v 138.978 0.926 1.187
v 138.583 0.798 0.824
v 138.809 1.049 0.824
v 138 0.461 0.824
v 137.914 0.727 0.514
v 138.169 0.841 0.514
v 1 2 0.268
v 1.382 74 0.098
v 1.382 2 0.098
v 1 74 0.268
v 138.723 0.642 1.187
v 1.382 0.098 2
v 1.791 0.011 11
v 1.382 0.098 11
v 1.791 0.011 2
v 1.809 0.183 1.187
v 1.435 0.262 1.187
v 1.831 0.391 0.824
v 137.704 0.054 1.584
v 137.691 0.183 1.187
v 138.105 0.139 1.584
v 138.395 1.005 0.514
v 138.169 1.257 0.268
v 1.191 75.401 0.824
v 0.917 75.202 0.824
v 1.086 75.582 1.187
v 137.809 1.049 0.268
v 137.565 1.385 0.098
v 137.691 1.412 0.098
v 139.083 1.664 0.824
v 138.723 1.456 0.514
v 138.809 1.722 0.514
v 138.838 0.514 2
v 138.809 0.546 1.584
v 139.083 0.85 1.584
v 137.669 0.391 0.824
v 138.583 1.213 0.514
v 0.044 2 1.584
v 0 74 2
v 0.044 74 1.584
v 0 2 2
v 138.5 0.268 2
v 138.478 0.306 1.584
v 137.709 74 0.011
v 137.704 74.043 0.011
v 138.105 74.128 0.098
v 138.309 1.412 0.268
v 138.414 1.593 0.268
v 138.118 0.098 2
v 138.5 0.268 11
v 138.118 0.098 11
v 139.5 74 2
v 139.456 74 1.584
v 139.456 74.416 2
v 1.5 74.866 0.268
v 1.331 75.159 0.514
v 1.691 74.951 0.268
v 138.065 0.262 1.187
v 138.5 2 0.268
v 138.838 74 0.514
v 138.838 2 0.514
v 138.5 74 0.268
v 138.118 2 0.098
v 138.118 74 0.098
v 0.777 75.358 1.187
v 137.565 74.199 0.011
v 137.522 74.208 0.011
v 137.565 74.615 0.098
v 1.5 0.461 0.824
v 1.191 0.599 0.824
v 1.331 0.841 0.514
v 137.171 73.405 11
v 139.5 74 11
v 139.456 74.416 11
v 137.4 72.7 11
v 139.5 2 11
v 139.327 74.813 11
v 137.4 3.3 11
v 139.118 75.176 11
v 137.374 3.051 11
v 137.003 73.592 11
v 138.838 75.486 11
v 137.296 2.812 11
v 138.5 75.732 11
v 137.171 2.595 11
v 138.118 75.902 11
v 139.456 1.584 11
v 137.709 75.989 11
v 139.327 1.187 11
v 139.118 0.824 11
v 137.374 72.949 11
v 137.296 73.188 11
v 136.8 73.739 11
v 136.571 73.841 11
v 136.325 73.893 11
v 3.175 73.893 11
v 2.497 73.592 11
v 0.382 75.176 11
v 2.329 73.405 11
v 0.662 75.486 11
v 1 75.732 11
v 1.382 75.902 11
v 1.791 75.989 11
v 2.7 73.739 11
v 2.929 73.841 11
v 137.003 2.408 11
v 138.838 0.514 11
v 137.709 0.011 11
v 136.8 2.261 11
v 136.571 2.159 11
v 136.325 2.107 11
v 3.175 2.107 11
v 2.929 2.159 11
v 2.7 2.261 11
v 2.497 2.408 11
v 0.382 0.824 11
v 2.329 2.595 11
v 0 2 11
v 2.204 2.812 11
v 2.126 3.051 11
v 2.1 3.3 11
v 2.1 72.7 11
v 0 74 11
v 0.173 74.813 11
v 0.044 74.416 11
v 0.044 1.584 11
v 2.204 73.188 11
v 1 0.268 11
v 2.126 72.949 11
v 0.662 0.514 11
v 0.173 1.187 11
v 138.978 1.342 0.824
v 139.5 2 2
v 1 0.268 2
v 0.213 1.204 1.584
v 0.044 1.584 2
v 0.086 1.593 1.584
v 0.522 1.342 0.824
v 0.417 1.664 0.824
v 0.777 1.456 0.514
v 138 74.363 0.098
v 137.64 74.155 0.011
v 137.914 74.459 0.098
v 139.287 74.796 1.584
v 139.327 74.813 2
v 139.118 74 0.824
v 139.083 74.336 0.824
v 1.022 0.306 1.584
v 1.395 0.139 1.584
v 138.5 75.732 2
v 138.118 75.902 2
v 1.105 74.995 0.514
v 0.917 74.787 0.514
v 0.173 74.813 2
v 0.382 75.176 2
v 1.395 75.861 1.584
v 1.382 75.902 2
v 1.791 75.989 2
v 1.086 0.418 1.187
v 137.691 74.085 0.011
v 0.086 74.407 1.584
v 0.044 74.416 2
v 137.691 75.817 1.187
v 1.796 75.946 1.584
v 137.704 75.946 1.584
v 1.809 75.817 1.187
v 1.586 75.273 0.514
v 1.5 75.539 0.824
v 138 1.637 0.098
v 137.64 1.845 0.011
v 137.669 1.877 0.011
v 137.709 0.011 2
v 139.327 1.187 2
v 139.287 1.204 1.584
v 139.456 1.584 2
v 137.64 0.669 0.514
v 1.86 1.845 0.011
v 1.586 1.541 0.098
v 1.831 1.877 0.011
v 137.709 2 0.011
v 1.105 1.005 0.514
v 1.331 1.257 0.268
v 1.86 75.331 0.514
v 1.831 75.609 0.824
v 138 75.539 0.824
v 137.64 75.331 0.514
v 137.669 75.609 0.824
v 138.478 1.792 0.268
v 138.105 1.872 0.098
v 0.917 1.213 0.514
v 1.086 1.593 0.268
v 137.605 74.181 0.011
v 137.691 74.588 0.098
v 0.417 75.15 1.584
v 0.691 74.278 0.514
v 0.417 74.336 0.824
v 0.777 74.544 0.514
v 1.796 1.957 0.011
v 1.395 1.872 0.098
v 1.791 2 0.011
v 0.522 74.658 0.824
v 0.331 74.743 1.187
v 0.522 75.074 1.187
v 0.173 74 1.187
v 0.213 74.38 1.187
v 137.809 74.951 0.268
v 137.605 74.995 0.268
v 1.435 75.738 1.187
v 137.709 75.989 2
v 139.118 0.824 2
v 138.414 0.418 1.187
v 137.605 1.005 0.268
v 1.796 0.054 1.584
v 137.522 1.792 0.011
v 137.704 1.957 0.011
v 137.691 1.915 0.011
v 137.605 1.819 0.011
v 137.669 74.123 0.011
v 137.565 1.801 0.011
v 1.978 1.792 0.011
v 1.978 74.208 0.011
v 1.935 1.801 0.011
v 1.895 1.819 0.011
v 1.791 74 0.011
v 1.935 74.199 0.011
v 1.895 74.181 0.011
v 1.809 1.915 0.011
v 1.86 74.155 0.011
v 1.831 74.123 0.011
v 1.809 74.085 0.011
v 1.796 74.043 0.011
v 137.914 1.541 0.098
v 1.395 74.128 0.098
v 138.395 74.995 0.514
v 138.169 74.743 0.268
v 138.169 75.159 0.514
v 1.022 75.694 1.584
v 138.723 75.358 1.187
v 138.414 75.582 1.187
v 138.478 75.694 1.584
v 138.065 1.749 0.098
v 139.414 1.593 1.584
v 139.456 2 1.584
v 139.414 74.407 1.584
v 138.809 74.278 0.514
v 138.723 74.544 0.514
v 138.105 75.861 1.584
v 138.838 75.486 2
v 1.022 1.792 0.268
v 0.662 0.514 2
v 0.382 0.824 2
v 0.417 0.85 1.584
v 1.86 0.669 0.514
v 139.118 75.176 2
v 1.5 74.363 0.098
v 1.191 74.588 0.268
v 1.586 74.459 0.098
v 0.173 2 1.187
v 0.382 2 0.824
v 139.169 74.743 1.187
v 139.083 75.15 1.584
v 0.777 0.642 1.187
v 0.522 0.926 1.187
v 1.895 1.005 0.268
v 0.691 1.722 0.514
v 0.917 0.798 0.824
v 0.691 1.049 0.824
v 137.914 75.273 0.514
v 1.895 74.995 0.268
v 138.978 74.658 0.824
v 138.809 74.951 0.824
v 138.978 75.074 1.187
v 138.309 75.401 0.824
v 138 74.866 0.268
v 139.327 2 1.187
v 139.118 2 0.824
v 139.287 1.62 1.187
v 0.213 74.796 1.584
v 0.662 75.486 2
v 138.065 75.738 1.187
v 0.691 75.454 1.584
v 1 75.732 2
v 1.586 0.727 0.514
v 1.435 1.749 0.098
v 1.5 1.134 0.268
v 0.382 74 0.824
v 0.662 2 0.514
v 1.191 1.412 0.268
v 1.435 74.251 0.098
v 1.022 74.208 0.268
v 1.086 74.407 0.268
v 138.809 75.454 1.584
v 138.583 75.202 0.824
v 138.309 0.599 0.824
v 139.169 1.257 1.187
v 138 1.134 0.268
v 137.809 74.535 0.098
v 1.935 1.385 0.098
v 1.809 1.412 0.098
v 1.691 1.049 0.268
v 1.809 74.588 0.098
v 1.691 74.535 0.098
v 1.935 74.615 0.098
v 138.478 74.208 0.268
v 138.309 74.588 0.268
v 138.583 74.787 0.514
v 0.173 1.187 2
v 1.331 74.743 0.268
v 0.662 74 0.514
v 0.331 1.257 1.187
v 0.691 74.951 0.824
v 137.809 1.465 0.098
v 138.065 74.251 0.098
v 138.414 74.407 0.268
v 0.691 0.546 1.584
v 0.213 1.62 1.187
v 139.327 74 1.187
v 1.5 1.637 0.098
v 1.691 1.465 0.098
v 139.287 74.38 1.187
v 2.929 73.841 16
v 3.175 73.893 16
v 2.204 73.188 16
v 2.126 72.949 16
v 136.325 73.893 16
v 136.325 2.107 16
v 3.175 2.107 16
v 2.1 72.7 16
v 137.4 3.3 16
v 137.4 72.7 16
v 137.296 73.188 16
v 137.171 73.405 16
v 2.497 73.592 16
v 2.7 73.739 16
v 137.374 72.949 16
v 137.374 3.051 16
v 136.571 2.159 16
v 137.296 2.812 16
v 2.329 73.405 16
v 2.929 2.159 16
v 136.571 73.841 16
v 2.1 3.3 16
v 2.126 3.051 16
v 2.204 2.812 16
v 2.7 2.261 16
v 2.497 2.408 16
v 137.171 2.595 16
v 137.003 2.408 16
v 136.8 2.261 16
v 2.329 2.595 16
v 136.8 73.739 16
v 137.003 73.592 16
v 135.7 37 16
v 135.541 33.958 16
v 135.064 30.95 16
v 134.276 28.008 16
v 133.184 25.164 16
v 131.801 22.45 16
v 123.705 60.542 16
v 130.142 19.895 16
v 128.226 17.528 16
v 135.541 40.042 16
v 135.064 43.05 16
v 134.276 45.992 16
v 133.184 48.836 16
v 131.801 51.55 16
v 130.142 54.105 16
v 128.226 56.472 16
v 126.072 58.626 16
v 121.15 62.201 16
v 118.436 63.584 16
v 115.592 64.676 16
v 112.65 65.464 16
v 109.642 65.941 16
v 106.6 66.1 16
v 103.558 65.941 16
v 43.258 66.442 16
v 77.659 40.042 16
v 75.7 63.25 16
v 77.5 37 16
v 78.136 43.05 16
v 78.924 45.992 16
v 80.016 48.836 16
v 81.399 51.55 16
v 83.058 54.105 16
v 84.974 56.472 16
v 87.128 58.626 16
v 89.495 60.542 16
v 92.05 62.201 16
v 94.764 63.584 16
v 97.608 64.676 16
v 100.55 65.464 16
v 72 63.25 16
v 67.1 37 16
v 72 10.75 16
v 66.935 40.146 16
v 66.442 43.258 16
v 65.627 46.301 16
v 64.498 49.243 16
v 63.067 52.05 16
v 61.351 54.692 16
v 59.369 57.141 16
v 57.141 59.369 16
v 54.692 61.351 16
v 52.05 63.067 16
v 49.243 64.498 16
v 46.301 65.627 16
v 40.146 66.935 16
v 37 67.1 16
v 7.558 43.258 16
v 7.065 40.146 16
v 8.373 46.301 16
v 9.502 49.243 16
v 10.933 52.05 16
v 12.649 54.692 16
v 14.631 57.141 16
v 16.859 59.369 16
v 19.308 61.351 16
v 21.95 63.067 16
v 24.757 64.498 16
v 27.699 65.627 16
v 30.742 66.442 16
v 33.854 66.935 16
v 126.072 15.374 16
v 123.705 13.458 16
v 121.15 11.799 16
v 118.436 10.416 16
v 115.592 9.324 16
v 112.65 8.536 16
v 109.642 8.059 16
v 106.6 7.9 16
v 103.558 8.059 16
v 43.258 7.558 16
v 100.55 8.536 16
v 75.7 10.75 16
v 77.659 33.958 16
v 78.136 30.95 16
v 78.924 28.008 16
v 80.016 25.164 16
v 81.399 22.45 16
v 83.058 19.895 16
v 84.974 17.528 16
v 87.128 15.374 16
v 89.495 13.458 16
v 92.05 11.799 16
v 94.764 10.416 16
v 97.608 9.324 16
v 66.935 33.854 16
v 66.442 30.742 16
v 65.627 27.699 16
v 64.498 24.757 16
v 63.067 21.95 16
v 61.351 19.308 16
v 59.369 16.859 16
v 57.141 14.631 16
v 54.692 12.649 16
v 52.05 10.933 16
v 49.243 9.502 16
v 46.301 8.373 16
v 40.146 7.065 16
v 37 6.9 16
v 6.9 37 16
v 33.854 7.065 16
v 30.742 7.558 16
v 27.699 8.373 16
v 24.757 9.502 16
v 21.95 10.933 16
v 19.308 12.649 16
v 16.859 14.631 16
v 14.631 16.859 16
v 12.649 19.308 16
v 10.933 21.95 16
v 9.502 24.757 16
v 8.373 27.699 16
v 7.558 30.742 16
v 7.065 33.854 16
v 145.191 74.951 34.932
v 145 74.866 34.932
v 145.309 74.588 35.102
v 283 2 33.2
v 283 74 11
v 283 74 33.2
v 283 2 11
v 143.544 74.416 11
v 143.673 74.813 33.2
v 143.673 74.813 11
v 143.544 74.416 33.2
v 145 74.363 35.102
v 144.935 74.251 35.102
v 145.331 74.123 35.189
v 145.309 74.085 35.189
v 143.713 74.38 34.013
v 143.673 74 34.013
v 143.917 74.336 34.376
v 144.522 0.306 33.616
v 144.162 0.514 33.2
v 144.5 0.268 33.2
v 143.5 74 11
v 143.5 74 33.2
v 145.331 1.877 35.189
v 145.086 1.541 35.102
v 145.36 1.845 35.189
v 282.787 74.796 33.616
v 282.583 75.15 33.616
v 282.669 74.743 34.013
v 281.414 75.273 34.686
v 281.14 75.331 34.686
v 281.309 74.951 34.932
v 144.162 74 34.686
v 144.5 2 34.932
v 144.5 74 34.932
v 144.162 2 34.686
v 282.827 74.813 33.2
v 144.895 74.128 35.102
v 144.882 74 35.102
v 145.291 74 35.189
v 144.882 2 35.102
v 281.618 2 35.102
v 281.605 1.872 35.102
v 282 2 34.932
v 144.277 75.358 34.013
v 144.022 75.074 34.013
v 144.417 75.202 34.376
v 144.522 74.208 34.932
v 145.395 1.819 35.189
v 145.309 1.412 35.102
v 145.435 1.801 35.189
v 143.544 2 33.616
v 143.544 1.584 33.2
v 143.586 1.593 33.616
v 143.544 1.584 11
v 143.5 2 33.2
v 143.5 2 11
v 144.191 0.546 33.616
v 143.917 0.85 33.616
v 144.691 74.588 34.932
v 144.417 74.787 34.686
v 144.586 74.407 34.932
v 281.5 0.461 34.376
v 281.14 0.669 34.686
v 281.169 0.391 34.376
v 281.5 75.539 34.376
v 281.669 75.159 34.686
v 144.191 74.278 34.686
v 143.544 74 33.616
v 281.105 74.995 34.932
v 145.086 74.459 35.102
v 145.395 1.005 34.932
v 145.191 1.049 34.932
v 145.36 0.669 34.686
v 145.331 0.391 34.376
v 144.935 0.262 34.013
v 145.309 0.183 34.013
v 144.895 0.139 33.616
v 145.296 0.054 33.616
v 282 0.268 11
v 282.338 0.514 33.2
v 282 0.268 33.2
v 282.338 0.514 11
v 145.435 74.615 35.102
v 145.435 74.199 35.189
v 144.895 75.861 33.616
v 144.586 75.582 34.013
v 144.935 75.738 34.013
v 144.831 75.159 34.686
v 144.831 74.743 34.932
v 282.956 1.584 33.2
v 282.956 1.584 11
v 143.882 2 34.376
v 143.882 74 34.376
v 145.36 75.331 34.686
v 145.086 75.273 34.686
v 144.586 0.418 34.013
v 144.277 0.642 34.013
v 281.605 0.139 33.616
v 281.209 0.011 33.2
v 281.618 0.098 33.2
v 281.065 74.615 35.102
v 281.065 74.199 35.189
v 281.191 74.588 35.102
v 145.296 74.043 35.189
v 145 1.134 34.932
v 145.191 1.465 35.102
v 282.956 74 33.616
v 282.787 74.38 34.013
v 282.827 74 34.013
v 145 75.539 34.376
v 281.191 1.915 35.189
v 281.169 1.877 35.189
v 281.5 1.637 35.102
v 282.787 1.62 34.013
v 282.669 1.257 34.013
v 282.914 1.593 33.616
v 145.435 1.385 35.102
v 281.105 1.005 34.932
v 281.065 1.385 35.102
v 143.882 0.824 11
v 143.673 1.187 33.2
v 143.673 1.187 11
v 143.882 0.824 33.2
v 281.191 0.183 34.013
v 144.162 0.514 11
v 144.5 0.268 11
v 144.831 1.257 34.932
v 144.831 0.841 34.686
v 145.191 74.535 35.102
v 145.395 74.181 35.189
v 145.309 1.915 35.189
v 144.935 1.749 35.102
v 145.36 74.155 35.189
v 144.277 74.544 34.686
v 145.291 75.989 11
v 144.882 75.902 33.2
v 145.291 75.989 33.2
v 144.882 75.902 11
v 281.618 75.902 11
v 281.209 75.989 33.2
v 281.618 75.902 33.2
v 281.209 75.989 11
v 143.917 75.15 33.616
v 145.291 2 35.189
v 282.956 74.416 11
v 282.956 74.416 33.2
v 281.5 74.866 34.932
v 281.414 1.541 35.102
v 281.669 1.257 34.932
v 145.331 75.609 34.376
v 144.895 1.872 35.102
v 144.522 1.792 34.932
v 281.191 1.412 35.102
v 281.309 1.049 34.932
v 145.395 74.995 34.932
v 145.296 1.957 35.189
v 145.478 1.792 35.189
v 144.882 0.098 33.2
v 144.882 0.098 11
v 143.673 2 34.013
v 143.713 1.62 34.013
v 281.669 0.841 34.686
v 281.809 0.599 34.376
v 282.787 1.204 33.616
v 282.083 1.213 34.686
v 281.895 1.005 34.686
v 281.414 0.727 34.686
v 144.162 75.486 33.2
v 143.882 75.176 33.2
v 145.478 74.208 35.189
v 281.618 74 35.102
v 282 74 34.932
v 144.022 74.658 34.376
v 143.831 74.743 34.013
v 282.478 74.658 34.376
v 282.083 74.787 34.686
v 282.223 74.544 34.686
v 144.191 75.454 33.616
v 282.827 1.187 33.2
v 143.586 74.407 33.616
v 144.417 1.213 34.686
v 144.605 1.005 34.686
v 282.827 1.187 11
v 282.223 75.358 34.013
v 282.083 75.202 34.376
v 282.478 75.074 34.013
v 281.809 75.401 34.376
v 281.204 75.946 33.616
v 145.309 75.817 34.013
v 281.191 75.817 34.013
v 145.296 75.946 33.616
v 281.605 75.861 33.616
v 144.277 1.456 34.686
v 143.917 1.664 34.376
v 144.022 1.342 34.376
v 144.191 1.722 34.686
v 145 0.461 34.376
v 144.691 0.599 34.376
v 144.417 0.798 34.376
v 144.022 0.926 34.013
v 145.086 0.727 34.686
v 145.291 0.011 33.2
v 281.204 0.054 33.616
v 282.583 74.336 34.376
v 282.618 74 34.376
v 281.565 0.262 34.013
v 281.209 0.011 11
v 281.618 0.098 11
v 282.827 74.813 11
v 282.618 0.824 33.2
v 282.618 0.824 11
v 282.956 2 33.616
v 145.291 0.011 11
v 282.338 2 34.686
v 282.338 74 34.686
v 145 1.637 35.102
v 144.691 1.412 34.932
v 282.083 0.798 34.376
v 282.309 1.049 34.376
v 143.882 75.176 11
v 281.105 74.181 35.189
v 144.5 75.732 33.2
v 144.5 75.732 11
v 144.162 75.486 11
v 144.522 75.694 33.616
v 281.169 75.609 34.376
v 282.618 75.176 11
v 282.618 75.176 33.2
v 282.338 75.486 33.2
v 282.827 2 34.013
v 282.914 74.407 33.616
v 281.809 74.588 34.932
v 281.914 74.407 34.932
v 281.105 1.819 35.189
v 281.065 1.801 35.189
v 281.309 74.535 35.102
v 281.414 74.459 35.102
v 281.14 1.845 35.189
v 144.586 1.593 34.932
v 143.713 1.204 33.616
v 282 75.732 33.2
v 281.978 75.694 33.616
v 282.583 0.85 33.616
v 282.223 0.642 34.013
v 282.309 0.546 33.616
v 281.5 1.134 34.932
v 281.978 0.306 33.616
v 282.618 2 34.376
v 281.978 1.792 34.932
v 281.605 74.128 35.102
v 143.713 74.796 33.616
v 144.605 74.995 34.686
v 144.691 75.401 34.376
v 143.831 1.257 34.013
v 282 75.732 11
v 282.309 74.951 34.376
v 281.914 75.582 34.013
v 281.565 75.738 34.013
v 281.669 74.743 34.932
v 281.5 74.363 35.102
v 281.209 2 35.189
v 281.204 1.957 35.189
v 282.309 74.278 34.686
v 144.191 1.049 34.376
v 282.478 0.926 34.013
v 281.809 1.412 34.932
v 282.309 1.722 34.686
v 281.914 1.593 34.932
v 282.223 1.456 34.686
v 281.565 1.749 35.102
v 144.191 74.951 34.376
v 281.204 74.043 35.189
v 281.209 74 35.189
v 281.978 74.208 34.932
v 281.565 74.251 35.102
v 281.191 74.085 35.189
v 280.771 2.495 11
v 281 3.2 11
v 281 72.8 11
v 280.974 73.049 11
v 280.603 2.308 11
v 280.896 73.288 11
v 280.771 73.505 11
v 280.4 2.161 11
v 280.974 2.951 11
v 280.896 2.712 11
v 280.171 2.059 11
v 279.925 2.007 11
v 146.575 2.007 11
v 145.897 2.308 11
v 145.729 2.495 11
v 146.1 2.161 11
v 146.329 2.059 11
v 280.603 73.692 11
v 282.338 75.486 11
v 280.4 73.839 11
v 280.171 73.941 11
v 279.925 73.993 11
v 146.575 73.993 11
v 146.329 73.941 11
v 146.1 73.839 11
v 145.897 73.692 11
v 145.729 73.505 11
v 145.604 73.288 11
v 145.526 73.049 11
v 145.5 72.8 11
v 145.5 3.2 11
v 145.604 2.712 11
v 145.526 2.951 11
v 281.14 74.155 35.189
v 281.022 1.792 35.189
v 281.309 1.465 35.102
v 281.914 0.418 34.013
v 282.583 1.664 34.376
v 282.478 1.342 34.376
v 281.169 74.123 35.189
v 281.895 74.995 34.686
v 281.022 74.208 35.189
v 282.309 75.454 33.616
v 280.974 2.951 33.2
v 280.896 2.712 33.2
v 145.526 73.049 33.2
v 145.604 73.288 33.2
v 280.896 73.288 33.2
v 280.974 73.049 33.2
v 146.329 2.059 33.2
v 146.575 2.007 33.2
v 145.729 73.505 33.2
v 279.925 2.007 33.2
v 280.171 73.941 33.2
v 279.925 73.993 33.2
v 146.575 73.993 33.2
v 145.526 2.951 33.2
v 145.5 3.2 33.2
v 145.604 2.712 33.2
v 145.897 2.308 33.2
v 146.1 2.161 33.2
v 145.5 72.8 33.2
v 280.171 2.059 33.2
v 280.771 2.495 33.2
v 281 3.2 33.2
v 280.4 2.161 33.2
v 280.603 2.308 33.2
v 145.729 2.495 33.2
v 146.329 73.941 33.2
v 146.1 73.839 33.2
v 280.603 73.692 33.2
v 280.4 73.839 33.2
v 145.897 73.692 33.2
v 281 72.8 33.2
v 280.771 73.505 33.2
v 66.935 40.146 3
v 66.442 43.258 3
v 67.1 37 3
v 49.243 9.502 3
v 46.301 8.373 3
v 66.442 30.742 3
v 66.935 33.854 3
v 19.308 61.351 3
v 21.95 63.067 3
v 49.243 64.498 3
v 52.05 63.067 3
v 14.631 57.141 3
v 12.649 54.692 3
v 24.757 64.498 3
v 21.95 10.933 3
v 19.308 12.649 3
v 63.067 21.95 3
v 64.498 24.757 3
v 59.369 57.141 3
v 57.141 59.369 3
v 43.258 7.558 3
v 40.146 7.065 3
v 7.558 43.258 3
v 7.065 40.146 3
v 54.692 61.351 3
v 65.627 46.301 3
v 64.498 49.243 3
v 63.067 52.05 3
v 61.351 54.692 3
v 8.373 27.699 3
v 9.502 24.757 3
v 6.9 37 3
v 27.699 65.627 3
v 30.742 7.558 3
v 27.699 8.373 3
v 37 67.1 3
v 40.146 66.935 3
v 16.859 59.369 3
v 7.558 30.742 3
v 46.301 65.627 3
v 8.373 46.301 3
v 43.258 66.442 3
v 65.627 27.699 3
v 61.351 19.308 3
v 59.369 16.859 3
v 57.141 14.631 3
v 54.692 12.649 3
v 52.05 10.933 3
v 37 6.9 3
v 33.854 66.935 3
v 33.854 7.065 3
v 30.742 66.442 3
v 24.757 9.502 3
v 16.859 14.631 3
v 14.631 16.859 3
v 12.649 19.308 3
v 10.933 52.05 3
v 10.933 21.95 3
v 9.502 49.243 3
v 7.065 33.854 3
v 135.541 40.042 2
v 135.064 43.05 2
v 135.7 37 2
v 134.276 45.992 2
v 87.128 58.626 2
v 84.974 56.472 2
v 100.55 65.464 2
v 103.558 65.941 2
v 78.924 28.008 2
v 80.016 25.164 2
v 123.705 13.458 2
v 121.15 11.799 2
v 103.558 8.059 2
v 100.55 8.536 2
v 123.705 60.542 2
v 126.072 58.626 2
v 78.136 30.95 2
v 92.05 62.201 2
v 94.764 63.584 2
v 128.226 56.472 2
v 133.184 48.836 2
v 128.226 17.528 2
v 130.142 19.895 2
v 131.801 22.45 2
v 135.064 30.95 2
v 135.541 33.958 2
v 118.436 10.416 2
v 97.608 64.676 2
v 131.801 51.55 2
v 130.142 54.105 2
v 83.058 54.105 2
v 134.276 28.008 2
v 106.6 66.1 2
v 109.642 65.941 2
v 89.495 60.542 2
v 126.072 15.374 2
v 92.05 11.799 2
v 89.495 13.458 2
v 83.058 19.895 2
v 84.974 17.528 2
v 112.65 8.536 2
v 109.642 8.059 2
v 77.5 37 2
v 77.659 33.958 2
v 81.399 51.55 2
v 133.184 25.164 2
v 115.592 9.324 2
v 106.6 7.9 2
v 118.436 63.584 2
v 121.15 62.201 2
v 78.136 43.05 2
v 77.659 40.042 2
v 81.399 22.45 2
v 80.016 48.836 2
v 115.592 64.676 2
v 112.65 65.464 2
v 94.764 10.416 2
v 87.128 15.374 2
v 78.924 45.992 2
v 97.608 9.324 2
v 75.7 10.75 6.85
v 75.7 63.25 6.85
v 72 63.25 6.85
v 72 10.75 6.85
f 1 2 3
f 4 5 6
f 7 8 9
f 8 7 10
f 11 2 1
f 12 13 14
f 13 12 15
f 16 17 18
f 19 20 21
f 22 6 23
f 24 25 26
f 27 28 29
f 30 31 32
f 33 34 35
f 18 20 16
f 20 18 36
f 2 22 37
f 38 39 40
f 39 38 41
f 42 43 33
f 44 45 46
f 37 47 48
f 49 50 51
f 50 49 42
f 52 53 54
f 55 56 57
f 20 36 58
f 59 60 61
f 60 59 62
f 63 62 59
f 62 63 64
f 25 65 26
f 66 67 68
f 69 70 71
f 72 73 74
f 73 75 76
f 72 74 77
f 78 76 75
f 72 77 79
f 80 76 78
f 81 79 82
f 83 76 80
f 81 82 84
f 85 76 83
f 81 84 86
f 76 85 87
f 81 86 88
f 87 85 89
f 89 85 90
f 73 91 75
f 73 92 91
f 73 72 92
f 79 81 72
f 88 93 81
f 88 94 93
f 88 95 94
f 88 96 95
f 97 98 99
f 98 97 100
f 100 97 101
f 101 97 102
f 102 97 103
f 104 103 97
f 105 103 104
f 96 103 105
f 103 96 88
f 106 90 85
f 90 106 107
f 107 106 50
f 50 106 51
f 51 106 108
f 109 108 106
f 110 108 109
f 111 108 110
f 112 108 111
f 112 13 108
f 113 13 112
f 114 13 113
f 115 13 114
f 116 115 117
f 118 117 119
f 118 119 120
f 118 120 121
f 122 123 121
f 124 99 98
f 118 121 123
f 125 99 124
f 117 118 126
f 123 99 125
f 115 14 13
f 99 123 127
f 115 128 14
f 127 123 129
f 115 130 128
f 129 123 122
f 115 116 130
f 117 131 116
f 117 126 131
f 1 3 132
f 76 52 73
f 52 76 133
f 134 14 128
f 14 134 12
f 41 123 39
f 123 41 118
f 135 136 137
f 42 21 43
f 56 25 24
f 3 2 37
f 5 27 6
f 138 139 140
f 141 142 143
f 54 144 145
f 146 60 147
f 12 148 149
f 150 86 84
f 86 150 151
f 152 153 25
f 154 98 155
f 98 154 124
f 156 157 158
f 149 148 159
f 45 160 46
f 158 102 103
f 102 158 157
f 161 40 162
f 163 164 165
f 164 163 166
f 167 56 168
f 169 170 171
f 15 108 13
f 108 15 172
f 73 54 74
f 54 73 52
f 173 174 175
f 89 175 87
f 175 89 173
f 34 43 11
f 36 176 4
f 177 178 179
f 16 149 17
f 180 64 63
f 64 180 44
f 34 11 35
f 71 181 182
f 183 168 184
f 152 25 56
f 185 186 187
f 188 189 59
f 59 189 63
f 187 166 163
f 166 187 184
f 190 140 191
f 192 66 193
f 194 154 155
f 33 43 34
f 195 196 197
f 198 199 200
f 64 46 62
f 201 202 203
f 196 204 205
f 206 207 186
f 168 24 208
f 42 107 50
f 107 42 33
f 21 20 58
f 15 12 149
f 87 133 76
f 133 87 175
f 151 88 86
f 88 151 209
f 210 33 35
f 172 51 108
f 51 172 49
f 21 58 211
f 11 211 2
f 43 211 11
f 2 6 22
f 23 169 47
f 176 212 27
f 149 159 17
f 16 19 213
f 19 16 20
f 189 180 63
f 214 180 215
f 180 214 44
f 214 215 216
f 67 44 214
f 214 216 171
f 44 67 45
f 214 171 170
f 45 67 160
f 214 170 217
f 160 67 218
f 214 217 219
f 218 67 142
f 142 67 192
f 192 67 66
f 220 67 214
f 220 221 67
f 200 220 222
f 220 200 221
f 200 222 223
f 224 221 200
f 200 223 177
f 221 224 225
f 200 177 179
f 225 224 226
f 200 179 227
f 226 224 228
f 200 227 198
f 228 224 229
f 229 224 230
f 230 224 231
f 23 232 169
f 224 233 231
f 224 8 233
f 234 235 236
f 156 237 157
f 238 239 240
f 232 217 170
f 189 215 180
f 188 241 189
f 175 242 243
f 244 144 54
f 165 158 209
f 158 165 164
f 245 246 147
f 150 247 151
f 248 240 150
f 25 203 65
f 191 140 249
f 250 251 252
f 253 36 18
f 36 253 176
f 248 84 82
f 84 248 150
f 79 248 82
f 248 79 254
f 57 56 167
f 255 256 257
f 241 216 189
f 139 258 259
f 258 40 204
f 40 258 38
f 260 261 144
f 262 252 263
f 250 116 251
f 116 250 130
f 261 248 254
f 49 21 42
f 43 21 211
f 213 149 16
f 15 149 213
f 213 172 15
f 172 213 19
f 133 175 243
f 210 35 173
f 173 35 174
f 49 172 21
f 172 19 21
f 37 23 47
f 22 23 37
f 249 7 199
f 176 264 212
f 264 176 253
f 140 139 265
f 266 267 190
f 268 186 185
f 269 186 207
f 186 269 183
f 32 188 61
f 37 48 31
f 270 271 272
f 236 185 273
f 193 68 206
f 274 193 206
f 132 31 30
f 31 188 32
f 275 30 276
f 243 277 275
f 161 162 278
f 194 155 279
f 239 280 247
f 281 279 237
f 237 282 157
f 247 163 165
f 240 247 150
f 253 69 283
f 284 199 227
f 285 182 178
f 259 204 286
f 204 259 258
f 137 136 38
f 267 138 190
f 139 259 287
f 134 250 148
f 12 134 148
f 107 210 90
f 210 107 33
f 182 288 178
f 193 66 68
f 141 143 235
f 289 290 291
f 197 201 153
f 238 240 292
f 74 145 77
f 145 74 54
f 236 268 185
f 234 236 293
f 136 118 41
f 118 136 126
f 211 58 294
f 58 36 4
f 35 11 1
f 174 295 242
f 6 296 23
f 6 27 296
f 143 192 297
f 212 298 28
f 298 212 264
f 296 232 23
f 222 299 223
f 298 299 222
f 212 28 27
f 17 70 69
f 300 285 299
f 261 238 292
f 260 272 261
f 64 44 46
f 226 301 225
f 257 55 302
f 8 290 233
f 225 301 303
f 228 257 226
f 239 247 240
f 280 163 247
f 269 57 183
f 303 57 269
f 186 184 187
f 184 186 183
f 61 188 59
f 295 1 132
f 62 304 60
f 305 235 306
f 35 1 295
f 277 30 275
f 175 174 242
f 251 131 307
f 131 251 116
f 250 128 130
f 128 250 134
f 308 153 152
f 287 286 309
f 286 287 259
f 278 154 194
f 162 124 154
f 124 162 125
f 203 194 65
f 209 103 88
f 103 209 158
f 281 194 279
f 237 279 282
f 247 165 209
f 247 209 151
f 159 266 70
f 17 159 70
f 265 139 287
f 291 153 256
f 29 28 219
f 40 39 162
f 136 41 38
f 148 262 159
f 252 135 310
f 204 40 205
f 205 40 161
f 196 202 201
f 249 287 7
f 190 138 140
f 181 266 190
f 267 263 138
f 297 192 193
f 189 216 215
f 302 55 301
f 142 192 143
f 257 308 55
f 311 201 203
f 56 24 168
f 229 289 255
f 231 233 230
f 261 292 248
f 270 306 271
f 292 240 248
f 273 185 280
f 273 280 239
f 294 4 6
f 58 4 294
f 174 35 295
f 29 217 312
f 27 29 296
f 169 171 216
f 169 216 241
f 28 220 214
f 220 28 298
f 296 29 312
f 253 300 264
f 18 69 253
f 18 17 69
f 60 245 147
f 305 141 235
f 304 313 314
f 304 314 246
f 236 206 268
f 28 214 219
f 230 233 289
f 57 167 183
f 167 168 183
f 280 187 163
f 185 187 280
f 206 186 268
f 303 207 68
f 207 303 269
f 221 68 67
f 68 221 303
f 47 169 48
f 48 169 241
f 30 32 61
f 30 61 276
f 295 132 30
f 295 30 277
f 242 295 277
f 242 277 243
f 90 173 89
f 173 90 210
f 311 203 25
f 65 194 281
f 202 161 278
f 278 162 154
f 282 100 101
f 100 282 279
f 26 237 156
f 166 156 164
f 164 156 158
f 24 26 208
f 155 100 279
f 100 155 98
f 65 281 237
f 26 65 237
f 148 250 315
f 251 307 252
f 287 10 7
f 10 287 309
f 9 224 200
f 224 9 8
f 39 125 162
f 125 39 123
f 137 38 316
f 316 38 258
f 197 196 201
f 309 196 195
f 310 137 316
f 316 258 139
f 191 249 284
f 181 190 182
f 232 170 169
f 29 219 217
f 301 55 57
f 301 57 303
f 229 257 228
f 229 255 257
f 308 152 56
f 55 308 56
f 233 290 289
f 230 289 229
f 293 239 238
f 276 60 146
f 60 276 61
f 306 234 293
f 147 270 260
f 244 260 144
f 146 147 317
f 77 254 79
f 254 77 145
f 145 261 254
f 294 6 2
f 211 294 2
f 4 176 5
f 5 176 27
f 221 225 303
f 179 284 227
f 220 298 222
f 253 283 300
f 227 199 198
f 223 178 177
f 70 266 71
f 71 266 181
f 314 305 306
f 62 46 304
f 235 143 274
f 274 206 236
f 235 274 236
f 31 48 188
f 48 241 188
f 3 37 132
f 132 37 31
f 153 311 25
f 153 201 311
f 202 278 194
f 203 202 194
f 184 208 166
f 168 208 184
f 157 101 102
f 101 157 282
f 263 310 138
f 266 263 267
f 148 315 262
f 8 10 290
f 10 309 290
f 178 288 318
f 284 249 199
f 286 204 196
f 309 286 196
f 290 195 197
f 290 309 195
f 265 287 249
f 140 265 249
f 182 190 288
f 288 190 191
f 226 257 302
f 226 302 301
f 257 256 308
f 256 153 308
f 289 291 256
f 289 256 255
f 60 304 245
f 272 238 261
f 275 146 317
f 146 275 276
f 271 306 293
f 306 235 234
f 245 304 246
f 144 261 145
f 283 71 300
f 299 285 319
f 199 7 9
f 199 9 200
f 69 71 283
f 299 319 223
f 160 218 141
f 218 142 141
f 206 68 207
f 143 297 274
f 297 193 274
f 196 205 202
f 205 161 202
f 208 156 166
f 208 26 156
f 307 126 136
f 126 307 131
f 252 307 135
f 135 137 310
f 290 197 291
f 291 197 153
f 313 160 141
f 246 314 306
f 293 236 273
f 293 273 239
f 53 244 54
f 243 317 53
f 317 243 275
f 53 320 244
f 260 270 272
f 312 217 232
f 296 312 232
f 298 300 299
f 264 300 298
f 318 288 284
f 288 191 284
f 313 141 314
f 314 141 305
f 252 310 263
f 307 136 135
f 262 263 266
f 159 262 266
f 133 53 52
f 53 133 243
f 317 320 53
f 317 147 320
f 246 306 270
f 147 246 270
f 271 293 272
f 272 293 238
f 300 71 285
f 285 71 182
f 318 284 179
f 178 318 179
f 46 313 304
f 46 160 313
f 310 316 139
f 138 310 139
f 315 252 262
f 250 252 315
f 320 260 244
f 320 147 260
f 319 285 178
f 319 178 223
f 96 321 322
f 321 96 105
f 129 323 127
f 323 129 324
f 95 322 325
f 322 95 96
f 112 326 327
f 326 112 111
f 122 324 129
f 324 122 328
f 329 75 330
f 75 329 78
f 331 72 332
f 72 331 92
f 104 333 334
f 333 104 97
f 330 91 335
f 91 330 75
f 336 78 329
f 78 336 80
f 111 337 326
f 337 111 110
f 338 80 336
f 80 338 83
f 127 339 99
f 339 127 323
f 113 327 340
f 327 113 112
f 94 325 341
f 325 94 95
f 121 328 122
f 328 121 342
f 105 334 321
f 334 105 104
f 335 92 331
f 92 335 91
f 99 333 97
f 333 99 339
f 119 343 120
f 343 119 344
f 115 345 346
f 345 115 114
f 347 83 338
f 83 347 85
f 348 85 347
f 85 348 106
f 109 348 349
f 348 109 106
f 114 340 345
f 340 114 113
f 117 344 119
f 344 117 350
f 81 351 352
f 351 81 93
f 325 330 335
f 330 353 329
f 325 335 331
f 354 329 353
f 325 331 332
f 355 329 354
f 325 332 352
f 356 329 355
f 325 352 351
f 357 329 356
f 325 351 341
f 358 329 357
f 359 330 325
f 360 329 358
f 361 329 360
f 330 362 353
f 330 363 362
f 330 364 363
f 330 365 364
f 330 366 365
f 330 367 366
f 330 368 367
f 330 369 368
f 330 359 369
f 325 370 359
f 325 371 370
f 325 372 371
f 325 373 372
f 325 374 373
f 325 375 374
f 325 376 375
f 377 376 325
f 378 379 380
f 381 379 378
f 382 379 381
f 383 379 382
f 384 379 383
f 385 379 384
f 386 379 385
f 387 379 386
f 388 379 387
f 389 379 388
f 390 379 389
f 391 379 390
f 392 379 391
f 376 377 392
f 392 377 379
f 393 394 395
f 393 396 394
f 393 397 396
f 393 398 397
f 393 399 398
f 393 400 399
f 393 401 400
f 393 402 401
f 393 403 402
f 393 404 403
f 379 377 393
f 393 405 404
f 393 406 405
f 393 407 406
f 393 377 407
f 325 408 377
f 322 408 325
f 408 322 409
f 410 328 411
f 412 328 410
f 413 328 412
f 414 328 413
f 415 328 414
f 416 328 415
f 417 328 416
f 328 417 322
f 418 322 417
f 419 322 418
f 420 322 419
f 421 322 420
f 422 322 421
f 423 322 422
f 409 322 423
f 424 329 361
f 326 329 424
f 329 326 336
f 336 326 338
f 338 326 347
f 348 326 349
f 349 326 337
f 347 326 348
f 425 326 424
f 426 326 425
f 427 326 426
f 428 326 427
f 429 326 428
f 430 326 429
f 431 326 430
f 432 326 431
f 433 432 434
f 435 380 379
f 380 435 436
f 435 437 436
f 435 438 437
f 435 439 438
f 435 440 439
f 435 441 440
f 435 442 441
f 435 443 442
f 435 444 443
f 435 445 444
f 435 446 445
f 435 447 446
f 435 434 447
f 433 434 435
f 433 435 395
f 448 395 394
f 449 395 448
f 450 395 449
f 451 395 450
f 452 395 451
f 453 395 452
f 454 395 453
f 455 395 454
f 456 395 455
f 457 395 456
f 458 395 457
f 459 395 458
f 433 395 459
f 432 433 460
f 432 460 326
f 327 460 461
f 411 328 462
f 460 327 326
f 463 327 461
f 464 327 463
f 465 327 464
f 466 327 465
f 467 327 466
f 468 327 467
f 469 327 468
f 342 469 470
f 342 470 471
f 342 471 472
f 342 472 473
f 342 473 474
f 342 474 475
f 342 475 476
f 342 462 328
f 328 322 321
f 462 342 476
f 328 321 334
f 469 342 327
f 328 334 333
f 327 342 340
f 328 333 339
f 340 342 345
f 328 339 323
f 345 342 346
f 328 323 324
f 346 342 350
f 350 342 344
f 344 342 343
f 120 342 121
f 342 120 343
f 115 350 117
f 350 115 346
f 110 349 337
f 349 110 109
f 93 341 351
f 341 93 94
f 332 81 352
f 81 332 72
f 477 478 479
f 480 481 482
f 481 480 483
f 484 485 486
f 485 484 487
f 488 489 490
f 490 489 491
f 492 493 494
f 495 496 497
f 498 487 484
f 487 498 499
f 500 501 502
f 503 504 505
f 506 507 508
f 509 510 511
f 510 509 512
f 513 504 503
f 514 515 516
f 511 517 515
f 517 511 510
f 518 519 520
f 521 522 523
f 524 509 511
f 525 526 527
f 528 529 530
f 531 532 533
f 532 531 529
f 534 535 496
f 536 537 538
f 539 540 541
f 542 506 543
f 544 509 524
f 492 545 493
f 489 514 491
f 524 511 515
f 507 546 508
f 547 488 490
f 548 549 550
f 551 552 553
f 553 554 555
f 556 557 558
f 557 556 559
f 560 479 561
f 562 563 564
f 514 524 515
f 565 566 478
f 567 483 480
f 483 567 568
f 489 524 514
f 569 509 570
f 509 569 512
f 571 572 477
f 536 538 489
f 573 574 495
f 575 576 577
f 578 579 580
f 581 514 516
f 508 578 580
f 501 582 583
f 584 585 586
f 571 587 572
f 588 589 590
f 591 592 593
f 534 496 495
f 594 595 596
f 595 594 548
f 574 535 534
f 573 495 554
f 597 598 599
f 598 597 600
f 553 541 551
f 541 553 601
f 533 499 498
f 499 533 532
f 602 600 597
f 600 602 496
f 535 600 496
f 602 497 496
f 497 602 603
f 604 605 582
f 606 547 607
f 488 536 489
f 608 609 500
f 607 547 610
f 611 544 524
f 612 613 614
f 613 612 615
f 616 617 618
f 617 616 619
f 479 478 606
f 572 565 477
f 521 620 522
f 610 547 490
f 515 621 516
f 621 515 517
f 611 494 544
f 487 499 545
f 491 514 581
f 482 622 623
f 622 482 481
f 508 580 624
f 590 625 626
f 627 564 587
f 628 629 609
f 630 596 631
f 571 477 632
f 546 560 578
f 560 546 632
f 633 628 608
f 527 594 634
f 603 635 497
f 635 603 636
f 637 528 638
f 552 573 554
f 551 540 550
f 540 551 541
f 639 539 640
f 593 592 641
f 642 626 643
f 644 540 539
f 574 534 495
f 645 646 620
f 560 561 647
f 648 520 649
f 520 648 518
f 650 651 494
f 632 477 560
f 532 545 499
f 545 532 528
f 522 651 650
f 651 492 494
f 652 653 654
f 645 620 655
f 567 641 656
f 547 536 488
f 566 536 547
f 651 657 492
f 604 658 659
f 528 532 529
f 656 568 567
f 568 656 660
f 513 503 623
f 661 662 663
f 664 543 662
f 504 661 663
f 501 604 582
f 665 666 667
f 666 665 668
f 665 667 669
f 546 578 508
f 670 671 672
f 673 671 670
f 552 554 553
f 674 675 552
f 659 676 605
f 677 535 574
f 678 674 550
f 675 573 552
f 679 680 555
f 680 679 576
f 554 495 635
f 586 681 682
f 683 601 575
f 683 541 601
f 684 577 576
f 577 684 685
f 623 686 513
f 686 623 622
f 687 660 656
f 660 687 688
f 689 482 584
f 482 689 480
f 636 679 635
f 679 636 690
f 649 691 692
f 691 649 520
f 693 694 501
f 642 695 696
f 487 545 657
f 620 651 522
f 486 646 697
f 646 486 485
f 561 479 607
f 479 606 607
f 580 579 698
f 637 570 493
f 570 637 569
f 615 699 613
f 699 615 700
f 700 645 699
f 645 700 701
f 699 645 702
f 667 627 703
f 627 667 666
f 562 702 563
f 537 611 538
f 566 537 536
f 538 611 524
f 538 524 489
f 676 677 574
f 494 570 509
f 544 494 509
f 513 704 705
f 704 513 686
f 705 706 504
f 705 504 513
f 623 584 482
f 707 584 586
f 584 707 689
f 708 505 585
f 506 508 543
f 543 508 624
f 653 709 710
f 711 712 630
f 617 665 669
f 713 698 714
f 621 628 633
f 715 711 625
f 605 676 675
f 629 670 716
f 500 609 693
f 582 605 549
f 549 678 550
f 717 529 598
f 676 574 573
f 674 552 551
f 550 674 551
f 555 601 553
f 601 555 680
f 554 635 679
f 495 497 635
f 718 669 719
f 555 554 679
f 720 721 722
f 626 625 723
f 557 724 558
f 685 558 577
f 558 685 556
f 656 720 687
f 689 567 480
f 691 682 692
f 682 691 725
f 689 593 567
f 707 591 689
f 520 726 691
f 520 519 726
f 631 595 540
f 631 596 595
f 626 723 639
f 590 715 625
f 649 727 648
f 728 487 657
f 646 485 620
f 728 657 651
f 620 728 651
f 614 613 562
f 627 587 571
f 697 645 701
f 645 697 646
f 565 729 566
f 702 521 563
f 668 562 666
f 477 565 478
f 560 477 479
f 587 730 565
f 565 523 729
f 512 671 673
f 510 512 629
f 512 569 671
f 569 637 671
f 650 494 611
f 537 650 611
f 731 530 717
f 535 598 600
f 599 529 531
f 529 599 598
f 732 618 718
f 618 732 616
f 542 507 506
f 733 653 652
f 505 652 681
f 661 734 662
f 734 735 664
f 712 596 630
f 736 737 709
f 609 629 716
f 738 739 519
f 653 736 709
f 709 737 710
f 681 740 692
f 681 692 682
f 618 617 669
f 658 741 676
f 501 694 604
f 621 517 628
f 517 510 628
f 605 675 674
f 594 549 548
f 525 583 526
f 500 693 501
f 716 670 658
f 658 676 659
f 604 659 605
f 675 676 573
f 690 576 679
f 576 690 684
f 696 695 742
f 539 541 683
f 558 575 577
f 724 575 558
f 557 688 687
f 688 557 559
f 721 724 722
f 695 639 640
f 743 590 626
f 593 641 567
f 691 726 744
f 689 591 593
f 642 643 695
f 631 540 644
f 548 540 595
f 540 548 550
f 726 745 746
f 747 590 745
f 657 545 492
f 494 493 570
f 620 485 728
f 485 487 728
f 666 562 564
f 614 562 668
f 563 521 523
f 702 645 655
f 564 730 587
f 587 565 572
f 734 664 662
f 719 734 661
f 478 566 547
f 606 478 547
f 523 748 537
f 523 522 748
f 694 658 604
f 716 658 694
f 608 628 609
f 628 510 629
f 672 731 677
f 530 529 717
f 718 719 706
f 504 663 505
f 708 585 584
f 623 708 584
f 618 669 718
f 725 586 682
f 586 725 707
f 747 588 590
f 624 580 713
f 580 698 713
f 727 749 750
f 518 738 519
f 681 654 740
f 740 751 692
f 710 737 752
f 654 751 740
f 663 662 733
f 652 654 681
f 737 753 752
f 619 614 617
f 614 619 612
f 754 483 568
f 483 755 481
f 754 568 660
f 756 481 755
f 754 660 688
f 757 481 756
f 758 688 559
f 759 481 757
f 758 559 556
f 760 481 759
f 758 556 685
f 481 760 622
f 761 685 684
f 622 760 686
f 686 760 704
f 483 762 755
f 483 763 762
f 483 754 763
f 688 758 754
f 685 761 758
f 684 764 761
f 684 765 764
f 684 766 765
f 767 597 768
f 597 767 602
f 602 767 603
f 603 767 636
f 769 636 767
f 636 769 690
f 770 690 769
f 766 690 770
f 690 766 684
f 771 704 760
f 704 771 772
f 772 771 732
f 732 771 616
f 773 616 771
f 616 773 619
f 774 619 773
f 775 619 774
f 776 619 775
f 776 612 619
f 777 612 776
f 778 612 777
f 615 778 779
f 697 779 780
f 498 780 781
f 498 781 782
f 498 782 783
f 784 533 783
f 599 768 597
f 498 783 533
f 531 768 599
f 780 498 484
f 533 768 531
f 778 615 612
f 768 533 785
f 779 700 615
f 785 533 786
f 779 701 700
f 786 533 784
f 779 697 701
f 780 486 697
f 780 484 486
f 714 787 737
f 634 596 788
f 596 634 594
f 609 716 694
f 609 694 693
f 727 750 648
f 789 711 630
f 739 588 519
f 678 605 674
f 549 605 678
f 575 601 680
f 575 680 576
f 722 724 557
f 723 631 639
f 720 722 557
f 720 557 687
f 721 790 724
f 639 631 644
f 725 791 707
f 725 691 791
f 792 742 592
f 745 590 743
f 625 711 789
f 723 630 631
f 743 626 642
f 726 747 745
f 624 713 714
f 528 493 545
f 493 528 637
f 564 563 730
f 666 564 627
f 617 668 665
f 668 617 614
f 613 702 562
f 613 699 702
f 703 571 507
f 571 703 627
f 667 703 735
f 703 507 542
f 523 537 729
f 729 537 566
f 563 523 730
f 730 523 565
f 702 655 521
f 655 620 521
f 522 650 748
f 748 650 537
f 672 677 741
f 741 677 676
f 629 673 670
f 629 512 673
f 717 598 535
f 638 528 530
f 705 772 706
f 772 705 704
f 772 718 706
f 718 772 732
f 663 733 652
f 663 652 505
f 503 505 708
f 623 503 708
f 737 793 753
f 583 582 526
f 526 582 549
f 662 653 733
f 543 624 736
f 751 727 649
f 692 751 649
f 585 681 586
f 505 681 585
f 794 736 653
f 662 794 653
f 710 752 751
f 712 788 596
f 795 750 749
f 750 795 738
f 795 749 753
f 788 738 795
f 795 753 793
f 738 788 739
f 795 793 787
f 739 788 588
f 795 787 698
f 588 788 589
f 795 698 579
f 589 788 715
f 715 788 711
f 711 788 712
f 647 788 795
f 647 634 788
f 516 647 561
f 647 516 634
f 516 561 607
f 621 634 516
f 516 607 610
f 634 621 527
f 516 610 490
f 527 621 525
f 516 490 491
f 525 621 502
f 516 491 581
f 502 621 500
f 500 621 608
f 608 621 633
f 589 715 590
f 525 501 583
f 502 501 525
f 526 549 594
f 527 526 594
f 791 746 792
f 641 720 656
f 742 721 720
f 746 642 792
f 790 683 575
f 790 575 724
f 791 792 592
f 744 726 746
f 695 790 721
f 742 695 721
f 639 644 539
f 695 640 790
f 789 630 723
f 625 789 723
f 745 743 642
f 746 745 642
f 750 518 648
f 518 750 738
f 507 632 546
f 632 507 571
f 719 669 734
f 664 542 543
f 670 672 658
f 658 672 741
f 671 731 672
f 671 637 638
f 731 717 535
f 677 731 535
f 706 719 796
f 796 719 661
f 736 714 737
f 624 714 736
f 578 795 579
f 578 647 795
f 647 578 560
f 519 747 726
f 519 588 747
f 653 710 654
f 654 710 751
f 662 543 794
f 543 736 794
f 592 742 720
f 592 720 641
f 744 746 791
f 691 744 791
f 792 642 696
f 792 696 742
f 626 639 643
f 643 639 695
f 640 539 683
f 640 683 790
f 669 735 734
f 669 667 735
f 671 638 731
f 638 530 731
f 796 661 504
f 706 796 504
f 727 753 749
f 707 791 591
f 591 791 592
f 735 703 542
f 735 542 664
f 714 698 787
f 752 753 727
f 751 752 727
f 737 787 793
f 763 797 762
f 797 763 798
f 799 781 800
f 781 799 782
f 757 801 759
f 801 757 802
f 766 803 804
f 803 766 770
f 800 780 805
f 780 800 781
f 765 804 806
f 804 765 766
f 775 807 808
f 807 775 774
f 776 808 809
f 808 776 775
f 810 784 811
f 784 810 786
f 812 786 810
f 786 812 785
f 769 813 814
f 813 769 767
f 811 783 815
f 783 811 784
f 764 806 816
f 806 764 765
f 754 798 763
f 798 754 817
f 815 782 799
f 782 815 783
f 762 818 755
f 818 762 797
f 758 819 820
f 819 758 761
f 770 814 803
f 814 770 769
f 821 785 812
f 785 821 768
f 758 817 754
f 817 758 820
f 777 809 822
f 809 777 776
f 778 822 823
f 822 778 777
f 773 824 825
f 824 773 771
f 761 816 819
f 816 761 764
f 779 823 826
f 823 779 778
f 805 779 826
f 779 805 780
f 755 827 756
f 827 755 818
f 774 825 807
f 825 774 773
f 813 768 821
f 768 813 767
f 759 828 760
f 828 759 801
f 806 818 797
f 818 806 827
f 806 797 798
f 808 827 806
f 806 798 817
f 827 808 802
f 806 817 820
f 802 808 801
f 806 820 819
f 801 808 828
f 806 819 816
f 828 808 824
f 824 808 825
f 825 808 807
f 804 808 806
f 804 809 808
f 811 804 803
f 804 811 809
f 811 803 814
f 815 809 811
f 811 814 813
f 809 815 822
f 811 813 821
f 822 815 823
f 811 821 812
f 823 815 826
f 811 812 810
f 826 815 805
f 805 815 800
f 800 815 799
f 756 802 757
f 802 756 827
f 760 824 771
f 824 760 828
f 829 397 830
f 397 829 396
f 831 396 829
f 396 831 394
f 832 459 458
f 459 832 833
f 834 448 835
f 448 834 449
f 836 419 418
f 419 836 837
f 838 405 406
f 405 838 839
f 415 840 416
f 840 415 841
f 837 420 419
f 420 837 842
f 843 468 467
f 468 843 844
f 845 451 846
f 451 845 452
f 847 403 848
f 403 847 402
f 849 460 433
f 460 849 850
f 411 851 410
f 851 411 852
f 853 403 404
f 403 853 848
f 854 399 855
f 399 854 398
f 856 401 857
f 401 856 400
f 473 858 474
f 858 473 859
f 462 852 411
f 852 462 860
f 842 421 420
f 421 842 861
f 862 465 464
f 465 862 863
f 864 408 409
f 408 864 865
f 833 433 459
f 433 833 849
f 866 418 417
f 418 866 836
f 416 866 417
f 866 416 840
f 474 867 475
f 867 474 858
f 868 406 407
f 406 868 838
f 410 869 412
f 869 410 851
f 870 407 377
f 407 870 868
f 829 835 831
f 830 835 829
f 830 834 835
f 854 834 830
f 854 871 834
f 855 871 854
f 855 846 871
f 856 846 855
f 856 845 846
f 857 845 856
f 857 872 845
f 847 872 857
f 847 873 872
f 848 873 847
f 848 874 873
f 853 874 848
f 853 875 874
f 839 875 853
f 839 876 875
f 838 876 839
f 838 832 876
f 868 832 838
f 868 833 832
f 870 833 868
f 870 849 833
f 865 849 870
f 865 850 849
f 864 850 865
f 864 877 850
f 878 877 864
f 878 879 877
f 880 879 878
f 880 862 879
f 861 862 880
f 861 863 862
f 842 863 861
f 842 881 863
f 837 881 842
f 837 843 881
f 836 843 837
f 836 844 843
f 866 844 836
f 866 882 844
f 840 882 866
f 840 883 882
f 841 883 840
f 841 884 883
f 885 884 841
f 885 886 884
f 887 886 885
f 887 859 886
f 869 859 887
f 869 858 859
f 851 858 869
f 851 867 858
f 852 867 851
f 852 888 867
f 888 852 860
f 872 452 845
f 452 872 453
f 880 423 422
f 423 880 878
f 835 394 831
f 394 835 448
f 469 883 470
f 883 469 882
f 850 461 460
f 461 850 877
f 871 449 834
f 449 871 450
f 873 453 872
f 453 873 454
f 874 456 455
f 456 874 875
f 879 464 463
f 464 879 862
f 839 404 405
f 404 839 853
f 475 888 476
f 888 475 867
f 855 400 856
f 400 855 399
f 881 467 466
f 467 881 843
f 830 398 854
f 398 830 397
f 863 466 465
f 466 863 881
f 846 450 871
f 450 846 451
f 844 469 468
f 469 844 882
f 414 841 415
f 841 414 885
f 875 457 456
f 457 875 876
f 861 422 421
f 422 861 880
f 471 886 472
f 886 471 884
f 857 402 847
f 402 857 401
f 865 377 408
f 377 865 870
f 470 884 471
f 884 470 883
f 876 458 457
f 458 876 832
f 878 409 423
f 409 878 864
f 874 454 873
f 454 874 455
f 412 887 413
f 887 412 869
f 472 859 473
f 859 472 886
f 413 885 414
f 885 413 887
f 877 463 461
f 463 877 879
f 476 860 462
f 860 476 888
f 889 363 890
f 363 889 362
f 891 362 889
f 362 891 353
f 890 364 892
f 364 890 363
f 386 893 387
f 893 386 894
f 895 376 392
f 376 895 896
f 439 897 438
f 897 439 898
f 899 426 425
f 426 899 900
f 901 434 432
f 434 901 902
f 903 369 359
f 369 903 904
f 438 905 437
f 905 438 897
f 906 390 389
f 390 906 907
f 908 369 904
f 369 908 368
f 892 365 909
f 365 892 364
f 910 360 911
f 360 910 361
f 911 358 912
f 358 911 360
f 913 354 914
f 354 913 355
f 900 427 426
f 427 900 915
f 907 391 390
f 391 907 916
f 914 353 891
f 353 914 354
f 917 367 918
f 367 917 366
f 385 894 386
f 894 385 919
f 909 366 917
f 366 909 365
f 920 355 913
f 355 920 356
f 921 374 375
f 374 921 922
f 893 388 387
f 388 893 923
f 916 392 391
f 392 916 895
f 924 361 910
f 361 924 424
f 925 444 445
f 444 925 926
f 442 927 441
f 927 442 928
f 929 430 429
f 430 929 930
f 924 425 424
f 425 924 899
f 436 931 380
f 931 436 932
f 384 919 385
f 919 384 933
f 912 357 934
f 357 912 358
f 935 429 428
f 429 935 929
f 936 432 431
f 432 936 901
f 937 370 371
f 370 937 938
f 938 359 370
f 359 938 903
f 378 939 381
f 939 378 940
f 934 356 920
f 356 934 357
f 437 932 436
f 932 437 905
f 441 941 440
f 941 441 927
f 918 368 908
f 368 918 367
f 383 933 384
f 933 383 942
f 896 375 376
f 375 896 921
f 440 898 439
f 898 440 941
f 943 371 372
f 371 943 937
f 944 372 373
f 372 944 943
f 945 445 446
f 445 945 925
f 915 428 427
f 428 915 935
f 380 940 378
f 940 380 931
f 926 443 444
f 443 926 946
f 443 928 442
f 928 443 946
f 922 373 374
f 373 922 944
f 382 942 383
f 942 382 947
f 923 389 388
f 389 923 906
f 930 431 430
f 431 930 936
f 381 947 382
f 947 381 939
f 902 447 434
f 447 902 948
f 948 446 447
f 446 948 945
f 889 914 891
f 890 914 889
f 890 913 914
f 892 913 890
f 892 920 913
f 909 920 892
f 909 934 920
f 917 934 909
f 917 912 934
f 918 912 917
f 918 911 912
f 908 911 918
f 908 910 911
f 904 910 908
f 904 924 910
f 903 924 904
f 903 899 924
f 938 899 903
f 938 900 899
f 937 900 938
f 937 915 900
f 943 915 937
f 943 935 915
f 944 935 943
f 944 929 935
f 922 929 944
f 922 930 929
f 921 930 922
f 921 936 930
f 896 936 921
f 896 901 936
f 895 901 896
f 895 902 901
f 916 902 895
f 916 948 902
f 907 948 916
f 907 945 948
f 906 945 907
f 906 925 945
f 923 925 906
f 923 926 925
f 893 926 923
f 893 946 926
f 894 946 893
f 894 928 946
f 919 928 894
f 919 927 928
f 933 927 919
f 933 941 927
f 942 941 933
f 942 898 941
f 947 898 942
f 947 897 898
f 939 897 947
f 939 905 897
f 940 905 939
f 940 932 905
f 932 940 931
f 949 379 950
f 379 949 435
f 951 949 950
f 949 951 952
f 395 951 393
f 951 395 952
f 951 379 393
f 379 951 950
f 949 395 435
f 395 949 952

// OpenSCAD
// file: ../../lib/logo45.scad
module logo45() translate([-100,-130,0]) import(file = "../res/45.svg");

logo45();
// file: ../../lib/box-with-lid.scad
// A rounded box with a lid
use <./logo45.scad>

$fn = 30;
// Parameters
// - dimension: [x, y, z] - x is front, y is depth, z is height (total)
//   Dimension is treated as INNER dimension, meaning walls will be added on all sides.
// - wall: number - default 2 - thickness of lid, lid edge (and hollow box of selected.
// - use_logo: boolean - default true
// - solid: boolean - default true - whether box is a solid block inside. Used for hollowing the box to create inserts.
// If false, the box will have wall*2 thickness (lid has wall*1)
// - inner_tolerance: number - default 2 - distance between lid and top of box on the inside.
module box_with_lid(dimensions = [ 40, 40, 20 ], wall = 2, use_logo = true, solid = true, inner_tolerance = 2,
                    lid_overlap = 5)
{
    printer_tolerance = 0.1; // Used to add a /little/ extra space for the lid to not get stuck
    lid_height = wall + inner_tolerance + lid_overlap;

    box_bottom();
    translate([ dimensions[0] + wall * 4, 0, 0 ]) box_lid();

    module box_bottom()
    {

        hull()
        {
            // helpers to avoid repetion below
            tr = wall; // Spheres and cylinders centers around origo
            tx = dimensions[0] - tr + wall * 2;
            ty = dimensions[1] - tr + wall * 2;
            tz = dimensions[2] - (tr + inner_tolerance) + wall;

            // Bottom
            translate([ tr, tr, tr ]) sphere(wall);
            translate([ tx, tr, tr ]) sphere(wall);
            translate([ tr, ty, tr ]) sphere(wall);
            translate([ tx, ty, tr ]) sphere(wall);
            // Top
            translate([ tr, tr, tz - lid_overlap ]) cylinder(r = wall, h = wall);
            translate([ tx, tr, tz - lid_overlap ]) cylinder(r = wall, h = wall);
            translate([ tr, ty, tz - lid_overlap ]) cylinder(r = wall, h = wall);
            translate([ tx, ty, tz - lid_overlap ]) cylinder(r = wall, h = wall);
        }

        hull()
        {
            r = wall * 0.6; // Inner radius
            // TBD: Find the right fraction for this rounding, or just use the magic number?
            tr = r + wall + printer_tolerance;
            tx = dimensions[0] - tr + wall * 2;
            ty = dimensions[1] - tr + wall * 2;
            tz = dimensions[2] - (lid_overlap + inner_tolerance) + wall;

            translate([ tr, tr, tz ]) cylinder(h = lid_overlap, r = r);
            translate([ tx, tr, tz ]) cylinder(h = lid_overlap, r = r);
            translate([ tr, ty, tz ]) cylinder(h = lid_overlap, r = r);
            translate([ tx, ty, tz ]) cylinder(h = lid_overlap, r = r);
        }
    }

    module box_lid()
    {
        lid_inner_height = lid_overlap + inner_tolerance;

        difference()
        {
            hull()
            {
                // helpers to avoid repetion below
                tr = wall; // Spheres and cylinders centers around origo
                tx = dimensions[0] - tr + wall * 2;
                ty = dimensions[1] - tr + wall * 2;
                tz = dimensions[2] - tr + wall * 2;
                tzb = tz - lid_overlap - inner_tolerance;

                // Top
                translate([ tr, tr, tz ]) sphere(wall);
                translate([ tx, tr, tz ]) sphere(wall);
                translate([ tr, ty, tz ]) sphere(wall);
                translate([ tx, ty, tz ]) sphere(wall);
                // Bottom
                translate([ tr, tr, tzb ]) cylinder(r = wall, h = wall);
                translate([ tx, tr, tzb ]) cylinder(r = wall, h = wall);
                translate([ tr, ty, tzb ]) cylinder(r = wall, h = wall);
                translate([ tx, ty, tzb ]) cylinder(r = wall, h = wall);
            }

            hull()
            {
                r = wall * 0.6; // Inner radius
                // TBD: Find the right fraction for this rounding, or just use the magic number?
                tr = r + wall;
                tx = dimensions[0] - tr + wall * 2;
                ty = dimensions[1] - tr + wall * 2;
                tz = dimensions[2] - (lid_overlap + inner_tolerance + wall) + wall * 2;
                translate([ tr, tr, tz ]) cylinder(h = lid_inner_height, r = r);
                translate([ tx, tr, tz ]) cylinder(h = lid_inner_height, r = r);
                translate([ tr, ty, tz ]) cylinder(h = lid_inner_height, r = r);
                translate([ tx, ty, tz ]) cylinder(h = lid_inner_height, r = r);
            }
        }
    }
}

box_with_lid();
// main file
use <../../lib/box-with-lid.scad>

// Globals
$fn = 60;
tolerance = 0.2;

// Main filter
filter_d = 60;
filter_outer_d = 70;
filter_h = 13; // lip = 1.7

// Stamp will always be stored in the filler
filler_outer_d = 60;
filler_outer_h = 20;
filler_inner_d = 58;
filler_lower_h = 14;
stamp_h = 31;

brush_t = 3.5;
brush_w = 12.2;
brush_l = 52.5;

// There is no spoon?
spoon_d = 24;
spoon_l = 96.6;
spoon_handle_t = 3;
spoon_handle_w = 13;

// Box nums
wall = 2;
width = filter_outer_d + filler_outer_d + wall + brush_t;
depth = max(filler_outer_d, filter_outer_d) + wall;
height = stamp_h + tolerance;
space = height - filler_lower_h;
echo(width, depth, height, space);

difference()
{
    box_with_lid([ width, depth, height ], wall = wall, inner_tolerance = space);
    color("pink") translate([ wall, wall, height - space + wall ]) cut_out();
}

// The cutout is modelled on Negative Z in order to be moved to top for cutting.
module cut_out()
{
    center = max(filter_outer_d / 2, filler_outer_d / 2, brush_l / 2);
    filter_r = (filter_d + tolerance) / 2;
    translate([ filter_outer_d / 2, center, -filter_h ]) cylinder(h = filter_h, r = filter_r);

    filler_r = (filler_inner_d + tolerance) / 2;
    translate([ filter_outer_d + filler_r + brush_t + wall, center, -filler_lower_h ])
        cylinder(h = filler_lower_h, r = filler_r);
    translate([ filter_outer_d, center - brush_l / 2, brush_w * -3 / 4 ])
        cube([ brush_t + tolerance, brush_l, brush_w * 3 / 4 ]);
}
